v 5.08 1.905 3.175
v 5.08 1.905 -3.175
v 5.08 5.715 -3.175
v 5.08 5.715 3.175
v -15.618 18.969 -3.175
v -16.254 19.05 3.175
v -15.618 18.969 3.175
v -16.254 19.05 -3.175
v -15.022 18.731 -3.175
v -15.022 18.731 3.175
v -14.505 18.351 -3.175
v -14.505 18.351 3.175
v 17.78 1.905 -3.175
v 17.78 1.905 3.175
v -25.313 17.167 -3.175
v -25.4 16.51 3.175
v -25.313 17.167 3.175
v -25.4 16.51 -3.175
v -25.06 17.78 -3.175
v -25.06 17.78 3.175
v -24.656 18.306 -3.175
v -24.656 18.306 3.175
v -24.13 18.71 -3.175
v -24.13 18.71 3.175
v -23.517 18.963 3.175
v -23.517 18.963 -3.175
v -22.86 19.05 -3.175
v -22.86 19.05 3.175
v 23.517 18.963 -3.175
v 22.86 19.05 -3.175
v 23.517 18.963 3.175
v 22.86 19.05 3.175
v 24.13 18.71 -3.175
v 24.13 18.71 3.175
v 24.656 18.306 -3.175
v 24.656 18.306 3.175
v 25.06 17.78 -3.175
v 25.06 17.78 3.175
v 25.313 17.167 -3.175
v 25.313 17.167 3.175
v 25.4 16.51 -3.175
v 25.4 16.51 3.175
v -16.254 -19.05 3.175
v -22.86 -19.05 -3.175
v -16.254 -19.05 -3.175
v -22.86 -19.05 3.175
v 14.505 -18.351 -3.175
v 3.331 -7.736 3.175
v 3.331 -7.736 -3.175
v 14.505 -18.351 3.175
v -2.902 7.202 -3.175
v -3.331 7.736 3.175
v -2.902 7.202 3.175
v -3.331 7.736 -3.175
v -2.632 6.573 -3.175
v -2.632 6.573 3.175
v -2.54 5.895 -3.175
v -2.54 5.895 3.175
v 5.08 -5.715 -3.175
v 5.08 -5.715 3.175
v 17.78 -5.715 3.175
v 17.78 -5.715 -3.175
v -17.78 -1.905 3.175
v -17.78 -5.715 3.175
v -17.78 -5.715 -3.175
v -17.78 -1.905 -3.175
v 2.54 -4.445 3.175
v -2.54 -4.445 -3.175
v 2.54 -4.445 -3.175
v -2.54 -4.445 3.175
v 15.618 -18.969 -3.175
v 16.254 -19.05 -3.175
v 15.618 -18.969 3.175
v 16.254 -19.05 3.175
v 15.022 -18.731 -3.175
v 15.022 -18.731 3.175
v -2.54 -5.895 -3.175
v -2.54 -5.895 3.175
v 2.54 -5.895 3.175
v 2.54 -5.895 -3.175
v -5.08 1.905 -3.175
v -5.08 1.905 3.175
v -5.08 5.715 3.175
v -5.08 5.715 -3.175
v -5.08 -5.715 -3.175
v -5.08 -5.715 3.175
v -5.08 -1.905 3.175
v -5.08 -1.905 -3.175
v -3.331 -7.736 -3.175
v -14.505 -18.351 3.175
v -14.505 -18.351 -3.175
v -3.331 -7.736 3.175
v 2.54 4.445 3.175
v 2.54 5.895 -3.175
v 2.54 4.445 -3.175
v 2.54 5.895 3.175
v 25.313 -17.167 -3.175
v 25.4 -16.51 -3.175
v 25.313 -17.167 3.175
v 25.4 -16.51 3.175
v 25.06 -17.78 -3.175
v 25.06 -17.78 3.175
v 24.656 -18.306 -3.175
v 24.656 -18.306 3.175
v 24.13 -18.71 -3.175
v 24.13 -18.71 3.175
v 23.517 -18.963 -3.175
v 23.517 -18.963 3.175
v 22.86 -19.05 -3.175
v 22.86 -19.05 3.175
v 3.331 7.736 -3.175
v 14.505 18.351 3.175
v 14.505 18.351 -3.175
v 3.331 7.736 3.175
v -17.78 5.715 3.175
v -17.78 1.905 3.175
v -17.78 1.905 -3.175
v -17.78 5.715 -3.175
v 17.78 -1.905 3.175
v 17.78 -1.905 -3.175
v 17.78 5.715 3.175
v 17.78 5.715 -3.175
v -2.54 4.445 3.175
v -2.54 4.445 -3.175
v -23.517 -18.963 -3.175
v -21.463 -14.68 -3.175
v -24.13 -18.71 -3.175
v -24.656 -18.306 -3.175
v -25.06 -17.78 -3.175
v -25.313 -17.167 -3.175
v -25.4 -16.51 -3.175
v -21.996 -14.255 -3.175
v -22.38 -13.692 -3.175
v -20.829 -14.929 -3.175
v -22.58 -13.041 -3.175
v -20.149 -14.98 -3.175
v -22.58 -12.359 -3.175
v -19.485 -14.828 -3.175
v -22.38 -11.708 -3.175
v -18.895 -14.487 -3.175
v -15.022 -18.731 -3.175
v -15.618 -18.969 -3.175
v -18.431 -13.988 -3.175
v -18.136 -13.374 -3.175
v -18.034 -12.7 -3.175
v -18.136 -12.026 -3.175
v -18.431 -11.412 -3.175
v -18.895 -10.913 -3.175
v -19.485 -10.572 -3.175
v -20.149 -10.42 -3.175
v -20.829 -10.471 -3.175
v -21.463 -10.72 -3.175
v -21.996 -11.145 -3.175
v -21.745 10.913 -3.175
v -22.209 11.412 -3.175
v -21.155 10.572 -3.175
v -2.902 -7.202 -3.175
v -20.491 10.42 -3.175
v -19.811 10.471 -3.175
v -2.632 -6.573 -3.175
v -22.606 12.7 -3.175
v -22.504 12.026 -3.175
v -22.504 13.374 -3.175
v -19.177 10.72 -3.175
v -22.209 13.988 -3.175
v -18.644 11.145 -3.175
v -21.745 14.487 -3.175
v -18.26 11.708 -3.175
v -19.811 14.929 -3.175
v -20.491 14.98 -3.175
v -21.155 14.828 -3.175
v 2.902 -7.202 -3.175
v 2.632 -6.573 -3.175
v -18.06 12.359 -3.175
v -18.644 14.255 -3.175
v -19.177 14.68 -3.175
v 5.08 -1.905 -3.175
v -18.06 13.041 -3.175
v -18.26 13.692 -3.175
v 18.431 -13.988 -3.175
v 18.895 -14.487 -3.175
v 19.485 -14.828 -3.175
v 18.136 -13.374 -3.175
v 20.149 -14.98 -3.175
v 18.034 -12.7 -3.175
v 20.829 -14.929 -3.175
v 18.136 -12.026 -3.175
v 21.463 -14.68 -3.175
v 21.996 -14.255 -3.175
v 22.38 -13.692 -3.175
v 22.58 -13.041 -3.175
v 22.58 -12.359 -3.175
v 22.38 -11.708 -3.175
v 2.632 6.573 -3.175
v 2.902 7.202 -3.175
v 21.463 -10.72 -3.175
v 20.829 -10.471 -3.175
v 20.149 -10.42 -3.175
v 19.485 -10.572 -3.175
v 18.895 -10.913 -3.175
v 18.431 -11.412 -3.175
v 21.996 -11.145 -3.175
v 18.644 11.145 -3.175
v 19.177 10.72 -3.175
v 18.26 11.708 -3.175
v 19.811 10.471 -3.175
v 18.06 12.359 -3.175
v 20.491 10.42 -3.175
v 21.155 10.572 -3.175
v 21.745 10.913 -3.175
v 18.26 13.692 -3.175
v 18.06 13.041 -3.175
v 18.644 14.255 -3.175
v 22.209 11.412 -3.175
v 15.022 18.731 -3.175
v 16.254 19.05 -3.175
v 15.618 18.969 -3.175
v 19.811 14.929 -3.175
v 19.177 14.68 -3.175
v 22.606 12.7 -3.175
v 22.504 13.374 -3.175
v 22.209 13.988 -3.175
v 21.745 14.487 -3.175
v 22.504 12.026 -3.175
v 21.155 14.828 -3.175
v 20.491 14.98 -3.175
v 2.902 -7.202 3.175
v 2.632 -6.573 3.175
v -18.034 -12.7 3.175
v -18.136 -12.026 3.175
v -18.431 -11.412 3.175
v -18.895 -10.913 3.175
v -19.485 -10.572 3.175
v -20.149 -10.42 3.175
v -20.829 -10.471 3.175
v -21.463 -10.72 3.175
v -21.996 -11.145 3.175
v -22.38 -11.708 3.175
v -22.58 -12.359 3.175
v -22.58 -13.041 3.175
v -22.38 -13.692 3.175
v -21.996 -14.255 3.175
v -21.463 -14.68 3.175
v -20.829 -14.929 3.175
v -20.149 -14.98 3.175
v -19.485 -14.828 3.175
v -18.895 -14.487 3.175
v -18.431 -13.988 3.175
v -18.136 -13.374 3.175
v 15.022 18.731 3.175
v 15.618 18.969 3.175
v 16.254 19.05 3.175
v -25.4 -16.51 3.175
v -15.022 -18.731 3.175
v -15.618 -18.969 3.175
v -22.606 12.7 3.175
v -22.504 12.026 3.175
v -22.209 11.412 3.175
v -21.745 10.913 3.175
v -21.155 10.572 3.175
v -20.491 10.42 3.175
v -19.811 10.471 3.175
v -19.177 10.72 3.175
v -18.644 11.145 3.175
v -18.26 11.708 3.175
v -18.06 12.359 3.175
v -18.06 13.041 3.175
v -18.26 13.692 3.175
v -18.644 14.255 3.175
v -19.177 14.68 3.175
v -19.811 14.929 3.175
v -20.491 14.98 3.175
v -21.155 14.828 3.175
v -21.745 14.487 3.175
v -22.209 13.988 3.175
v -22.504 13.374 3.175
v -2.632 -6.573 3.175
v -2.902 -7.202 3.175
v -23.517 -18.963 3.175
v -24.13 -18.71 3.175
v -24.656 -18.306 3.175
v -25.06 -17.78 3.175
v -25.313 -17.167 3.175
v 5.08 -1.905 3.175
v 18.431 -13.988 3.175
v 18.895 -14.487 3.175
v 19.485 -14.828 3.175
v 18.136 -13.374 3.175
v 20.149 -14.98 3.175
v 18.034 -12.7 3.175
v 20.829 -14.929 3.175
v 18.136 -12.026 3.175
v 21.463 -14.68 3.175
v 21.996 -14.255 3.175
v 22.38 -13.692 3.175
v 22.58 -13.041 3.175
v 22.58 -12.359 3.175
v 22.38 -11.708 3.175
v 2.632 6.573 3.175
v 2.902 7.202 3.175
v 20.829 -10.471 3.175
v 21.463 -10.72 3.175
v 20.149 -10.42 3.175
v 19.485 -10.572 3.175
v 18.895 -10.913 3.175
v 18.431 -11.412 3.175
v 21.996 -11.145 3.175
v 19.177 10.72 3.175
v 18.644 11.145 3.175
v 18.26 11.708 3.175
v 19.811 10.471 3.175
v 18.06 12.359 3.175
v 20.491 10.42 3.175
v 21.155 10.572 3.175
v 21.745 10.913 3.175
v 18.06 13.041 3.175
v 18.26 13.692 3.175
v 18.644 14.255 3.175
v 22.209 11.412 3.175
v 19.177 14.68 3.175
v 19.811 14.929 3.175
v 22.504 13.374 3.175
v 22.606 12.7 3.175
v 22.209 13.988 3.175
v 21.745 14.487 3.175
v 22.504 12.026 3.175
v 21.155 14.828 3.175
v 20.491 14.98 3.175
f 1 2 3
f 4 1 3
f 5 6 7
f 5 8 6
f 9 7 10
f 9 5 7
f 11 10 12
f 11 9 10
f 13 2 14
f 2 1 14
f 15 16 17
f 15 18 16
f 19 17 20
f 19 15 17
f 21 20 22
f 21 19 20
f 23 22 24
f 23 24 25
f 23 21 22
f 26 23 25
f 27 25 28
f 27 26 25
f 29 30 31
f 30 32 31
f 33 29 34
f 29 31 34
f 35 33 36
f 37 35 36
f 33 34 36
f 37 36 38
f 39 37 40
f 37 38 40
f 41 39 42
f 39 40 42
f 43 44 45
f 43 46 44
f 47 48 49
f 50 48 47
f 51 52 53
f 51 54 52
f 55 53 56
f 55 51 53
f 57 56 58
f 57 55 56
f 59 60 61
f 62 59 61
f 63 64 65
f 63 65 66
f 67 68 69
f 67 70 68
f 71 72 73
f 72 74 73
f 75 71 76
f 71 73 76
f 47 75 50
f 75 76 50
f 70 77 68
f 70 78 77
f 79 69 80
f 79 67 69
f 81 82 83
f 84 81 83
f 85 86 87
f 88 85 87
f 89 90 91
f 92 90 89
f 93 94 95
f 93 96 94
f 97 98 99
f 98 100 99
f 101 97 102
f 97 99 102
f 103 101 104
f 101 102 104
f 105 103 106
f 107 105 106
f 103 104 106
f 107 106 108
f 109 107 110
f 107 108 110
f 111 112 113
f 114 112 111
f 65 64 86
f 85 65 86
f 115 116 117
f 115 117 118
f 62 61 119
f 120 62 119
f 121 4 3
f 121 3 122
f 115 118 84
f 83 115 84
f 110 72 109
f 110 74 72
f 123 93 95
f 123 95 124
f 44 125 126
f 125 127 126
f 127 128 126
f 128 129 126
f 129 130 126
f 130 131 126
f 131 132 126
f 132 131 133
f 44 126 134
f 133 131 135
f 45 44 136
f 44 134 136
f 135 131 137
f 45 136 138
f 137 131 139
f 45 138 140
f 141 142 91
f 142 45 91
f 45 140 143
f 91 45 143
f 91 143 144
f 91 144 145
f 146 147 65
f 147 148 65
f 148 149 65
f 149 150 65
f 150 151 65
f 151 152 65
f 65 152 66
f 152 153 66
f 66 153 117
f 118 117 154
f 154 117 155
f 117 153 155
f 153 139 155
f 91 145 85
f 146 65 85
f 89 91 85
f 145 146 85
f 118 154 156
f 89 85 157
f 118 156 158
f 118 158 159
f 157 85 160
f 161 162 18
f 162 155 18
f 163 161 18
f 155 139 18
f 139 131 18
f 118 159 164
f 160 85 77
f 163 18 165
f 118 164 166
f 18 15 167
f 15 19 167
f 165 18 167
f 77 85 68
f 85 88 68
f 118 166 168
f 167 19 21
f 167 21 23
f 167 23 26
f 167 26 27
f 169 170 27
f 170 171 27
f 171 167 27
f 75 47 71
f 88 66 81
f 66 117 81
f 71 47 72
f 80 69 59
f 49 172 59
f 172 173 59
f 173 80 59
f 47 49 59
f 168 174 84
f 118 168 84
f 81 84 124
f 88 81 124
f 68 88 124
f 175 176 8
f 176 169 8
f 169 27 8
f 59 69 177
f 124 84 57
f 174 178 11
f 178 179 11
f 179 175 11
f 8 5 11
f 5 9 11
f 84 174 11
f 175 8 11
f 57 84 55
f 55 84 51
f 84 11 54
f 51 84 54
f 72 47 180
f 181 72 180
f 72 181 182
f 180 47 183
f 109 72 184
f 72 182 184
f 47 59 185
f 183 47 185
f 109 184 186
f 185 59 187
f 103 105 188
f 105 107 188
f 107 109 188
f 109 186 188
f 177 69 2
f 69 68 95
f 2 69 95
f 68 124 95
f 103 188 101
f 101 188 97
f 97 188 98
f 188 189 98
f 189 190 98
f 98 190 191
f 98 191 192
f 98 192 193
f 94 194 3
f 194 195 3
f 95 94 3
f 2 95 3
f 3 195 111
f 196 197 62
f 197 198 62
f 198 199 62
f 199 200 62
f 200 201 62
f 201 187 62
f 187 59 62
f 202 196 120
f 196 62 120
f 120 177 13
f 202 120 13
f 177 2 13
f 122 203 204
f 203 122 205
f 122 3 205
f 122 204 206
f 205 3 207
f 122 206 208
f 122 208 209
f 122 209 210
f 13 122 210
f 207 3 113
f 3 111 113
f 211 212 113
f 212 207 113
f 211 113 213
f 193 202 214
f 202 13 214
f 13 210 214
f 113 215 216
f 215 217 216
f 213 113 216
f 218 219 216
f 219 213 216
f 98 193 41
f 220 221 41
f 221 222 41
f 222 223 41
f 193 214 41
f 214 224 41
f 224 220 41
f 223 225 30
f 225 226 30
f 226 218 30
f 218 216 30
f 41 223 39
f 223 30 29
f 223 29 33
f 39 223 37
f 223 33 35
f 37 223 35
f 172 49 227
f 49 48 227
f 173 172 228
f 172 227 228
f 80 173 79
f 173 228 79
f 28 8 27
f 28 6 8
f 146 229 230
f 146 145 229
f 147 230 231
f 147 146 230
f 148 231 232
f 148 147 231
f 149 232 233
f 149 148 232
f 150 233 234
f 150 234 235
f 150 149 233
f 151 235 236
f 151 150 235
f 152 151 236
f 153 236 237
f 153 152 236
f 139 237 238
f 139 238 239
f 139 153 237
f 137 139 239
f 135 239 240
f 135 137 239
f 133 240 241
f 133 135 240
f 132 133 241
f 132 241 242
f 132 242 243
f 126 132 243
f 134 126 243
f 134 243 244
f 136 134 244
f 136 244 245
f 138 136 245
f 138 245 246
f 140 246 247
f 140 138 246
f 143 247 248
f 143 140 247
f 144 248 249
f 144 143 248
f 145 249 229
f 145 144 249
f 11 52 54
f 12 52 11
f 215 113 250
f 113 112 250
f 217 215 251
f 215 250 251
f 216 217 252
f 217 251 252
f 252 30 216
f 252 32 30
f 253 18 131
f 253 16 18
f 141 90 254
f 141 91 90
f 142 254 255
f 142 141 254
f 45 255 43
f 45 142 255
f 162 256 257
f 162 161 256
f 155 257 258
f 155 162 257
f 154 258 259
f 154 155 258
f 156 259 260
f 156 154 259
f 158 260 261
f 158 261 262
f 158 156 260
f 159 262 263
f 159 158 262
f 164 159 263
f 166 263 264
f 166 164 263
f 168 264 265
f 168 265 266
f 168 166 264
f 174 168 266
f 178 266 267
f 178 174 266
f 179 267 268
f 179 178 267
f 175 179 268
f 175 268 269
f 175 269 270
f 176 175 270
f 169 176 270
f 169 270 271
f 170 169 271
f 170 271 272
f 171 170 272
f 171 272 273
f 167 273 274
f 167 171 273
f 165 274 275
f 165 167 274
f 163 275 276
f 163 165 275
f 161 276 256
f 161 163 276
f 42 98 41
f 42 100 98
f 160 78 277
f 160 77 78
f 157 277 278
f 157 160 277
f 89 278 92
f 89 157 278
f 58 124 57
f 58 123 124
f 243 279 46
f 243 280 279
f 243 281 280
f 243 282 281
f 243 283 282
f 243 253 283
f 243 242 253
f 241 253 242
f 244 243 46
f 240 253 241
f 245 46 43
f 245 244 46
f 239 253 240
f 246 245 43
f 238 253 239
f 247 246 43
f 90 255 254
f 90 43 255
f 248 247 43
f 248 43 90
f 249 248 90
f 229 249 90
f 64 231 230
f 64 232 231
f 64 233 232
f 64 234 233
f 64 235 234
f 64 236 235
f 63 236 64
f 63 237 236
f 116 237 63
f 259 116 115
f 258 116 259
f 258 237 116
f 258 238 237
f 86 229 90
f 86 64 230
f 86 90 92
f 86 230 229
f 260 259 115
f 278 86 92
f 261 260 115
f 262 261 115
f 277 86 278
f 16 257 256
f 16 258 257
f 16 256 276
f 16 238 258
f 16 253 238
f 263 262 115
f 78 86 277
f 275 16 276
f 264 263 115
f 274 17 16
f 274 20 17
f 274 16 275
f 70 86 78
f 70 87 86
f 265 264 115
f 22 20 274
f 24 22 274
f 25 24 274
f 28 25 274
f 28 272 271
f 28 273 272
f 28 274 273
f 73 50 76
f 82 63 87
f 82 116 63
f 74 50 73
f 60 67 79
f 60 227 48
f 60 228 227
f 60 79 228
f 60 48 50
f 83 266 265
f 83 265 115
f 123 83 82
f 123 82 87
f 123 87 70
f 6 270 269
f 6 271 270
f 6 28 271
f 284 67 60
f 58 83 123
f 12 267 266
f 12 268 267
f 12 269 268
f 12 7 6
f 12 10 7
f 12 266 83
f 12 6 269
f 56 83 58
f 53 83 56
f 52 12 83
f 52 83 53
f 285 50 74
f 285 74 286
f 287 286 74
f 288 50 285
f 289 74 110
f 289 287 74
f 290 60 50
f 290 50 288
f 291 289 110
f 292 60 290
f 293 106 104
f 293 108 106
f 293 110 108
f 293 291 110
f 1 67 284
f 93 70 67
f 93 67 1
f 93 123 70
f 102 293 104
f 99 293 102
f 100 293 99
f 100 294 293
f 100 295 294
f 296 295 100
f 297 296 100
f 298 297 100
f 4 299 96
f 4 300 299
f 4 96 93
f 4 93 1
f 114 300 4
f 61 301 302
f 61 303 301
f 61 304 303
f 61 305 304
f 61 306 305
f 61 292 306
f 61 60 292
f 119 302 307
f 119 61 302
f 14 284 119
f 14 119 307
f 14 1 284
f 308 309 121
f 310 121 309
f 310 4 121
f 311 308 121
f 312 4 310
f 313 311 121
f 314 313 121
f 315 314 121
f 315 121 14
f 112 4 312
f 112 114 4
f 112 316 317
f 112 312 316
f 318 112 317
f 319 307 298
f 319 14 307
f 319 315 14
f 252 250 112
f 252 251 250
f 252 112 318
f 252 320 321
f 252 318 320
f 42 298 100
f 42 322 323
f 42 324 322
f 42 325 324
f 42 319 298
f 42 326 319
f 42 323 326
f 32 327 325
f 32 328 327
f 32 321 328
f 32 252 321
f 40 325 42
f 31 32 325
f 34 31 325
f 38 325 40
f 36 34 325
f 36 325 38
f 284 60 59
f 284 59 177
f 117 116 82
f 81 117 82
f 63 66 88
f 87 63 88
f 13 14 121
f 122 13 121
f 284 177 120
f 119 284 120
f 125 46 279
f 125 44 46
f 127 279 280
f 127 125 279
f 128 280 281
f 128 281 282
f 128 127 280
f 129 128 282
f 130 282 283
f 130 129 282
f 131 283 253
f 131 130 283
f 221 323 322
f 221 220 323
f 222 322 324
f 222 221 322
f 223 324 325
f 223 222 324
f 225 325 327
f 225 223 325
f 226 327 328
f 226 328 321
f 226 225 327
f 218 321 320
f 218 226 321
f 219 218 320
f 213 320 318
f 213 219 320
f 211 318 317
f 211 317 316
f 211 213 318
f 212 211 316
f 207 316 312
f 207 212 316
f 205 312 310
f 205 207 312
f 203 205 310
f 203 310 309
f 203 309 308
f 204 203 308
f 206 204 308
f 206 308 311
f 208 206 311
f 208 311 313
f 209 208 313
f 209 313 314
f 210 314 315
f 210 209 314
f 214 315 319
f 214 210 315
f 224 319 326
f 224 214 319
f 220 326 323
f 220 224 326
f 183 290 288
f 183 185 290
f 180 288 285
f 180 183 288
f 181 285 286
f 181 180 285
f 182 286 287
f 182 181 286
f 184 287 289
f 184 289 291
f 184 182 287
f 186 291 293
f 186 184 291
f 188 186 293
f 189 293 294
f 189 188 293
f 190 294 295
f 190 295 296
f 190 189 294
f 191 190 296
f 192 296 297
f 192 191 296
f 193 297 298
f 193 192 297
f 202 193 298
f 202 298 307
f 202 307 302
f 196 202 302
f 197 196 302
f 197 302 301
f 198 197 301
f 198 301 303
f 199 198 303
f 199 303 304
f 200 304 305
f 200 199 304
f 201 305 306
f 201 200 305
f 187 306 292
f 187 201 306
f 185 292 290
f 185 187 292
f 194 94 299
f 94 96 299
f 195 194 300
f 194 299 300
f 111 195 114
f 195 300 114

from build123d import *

# Parameters (mm, degrees)
SKETCH1_R           = 2.286
SKETCH1_W           = 12.7
SKETCH1_H           = 3.81
BOSS_EXTRUDE1_DEPTH = 3.175
FILLET1_R           = 2.54


with BuildPart() as part:
    # Sketch1 → Boss-Extrude1 (new, symmetric)
    with BuildSketch(Plane.XY):
        Polygon((-2.54, -4.445), (2.54, -4.445), (2.54, -6.985), (15.24, -19.05), (25.4, -19.05), (25.4, 19.05), (15.24, 19.05), (2.54, 6.985), (2.54, 4.445), (-2.54, 4.445), (-2.54, 6.985), (-15.24, 19.05), (-25.4, 19.05), (-25.4, -19.05), (-15.24, -19.05), (-2.54, -6.985), align=None)
        with Locations((-20.32, -12.7)):
            Circle(SKETCH1_R, mode=Mode.SUBTRACT)
        with Locations(Location((-20.32, 12.7, 0), (0, 0, 180))):
            Circle(SKETCH1_R, mode=Mode.SUBTRACT)
        with Locations((20.32, 12.7)):
            Circle(SKETCH1_R, mode=Mode.SUBTRACT)
        with Locations(Location((20.32, -12.7, 0), (0, 0, 180))):
            Circle(SKETCH1_R, mode=Mode.SUBTRACT)
        with Locations((-11.43, 3.81)):
            Rectangle(SKETCH1_W, SKETCH1_H, mode=Mode.SUBTRACT)
        with Locations((-11.43, -3.81)):
            Rectangle(SKETCH1_W, SKETCH1_H, mode=Mode.SUBTRACT)
        with Locations((11.43, -3.81)):
            Rectangle(SKETCH1_W, SKETCH1_H, mode=Mode.SUBTRACT)
        with Locations((11.43, 3.81)):
            Rectangle(SKETCH1_W, SKETCH1_H, mode=Mode.SUBTRACT)
    extrude(amount=BOSS_EXTRUDE1_DEPTH, both=True)

    # Fillet1
    fillet1_edges = [part.edges().sort_by_distance(p)[0] for p in [
        (-2.54, -6.985, 0),
        (-15.24, -19.05, 0),
        (-25.4, -19.05, 0),
        (-25.4, 19.05, 0),
        (-15.24, 19.05, 0),
        (-2.54, 6.985, 0),
        (2.54, 6.985, 0),
        (15.24, 19.05, 0),
        (25.4, 19.05, 0),
        (25.4, -19.05, 0),
        (15.24, -19.05, 0),
        (2.54, -6.985, 0),
    ]]
    fillet(fillet1_edges, radius=FILLET1_R)


solid = part.part
